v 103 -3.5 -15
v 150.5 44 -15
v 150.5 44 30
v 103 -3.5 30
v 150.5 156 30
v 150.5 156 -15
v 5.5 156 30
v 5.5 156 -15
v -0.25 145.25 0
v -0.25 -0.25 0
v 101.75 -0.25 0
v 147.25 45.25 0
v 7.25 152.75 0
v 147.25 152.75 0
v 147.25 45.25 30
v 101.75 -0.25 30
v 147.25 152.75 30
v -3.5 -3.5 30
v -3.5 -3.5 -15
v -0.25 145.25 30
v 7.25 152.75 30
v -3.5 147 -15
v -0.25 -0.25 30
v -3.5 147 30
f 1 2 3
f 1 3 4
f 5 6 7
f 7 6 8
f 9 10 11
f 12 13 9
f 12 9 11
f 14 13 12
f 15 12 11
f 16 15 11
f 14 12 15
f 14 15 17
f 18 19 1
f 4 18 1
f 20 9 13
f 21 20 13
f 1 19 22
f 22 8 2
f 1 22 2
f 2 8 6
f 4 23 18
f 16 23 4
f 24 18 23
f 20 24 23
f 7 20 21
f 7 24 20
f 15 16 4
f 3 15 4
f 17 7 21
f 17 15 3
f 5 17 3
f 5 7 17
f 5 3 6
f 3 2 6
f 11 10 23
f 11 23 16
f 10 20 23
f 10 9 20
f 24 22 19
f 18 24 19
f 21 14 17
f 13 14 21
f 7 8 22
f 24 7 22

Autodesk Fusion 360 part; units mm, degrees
sketch "BoardOutline" plane through (0, 0, 0) normal (0, 0, 1) x (1, 0, 0)
  line L0 (0, 0) -> (101.5, 0)
  line L1 (147, 45.5) -> (147, 152.5)
  line L2 (147, 152.5) -> (7.5, 152.5)
  line L3 (0, 145) -> (0, 0)
  line L4 (7.5, 152.5) -> (0, 145)
  line L5 (147, 45.5) -> (101.5, 0)
  line L6 (7.5, 152.5) -> (7.5, 0) construction
  line L7 (147, 45.5) -> (0, 45.5) construction
  line L8 (101.5, 0) -> (101.5, 152.5) construction
  circle A0 centre (101.5, 45.5) radius 2
  line L9 (0, 145) -> (147, 145) construction
  circle A1 centre (7.5, 145) radius 2
  circle A2 centre (41.5, 145) radius 2
  circle A3 centre (134.5, 145) radius 2
  line L10 (134.5, 152.5) -> (134.5, 33) construction
  circle A4 centre (134.5, 90) radius 2
  circle A5 centre (134.5, 90) radius 2
  circle A6 centre (134.5, 90) radius 2
  circle A7 centre (41.5, 90) radius 2
  circle A8 centre (7.5, 133.5) radius 1.5
  circle A9 centre (7.5, 124.5) radius 1
  circle A10 centre (7.5, 87.5) radius 1
  circle A11 centre (26.5, 124.5) radius 1
  circle A12 centre (26.5, 87.5) radius 1
  circle A13 centre (7.5, 73.5) radius 2
  circle A14 centre (7.5, 7.5) radius 2
  circle A15 centre (131.0677, 63.4488) radius 6 construction
  line L11 (16.5, 0) -> (23.5, 0) construction
  line L12 (23.5, 0) -> (23.5, 13.6837) construction
  line L13 (23.5, 13.6837) -> (16.5, 13.6837) construction
  line L14 (16.5, 13.6837) -> (16.5, 0) construction
  line L15 (96, 0) -> (26, 0) construction
  line L16 (26, 0) -> (26, 82.5) construction
  line L17 (26, 82.5) -> (96, 82.5) construction
  line L18 (96, 82.5) -> (96, 0) construction
  line L19 (55.5, 0) -> (55.5, 10) construction
  line L20 (55.5, 10) -> (45.5, 10) construction
  line L21 (45.5, 10) -> (45.5, 0) construction
  line L22 (45.5, 0) -> (55.5, 0) construction
  line L23 (101.5, 45.5) -> (96, 45.5) construction
  line L24 (55.5, 0) -> (96, 0) construction
  line L25 (51, 130) -> (125, 130) construction
  line L26 (125, 130) -> (125, 105) construction
  line L27 (125, 105) -> (51, 105) construction
  line L28 (51, 105) -> (51, 130) construction
  point P0 (147, 0)
  point P1 (0, 152.5)
  point P2 (7.5, 145)
  point P3 (7.5, 73.5)
  dimension "d1" = 147
  dimension "d2" = 152.5
  dimension "d3" = 7.5
  dimension "d4" = 7.5
  dimension "d5" = 45.5
  dimension "d6" = 45.5
  dimension "d8" = 4
  dimension "d12" = 4
  dimension "d13" = 4
  dimension "d14" = 4
  dimension "d15" = 4
  dimension "d16" = 4
  dimension "d17" = 4
  dimension "d18" = 4
  dimension "d20" = 3
  dimension "d23" = 2
  dimension "d24" = 2
  dimension "d25" = 2
  dimension "d26" = 2
  dimension "d27" = 4
  dimension "d28" = 4
  dimension "d31" = 12
  dimension "d34" = 7
  dimension "d35" = 70
  dimension "d36" = 82.5
  dimension "d39" = 10
  dimension "d40" = 5.5
  dimension "d41" = 93
  dimension "d43" = 55
  dimension "d46" = 34
sketch "CasingOutline" plane through (0, 0, 0) normal (0, 0, 1) x (1, 0, 0)
  line L0 (-0.25, -0.25) -> (101.75, -0.25)
  line L1 (147.25, 45.25) -> (147.25, 152.75)
  line L2 (147.25, 152.75) -> (7.25, 152.75)
  line L3 (-0.25, 145.25) -> (-0.25, -0.25)
  line L4 (-3.5, -3.5) -> (103, -3.5)
  line L5 (150.5, 44) -> (150.5, 156)
  line L6 (150.5, 156) -> (5.5, 156)
  line L7 (-3.5, 147) -> (-3.5, -3.5)
  line L8 (147, 152.5) -> (7.5, 152.5)
  line L9 (147.25, 45.25) -> (101.75, -0.25)
  line L10 (-0.25, 145.25) -> (7.25, 152.75)
  line L11 (5.5, 156) -> (-3.5, 147)
  line L12 (150.5, 44) -> (103, -3.5)
  point P0 (147.25, -0.25)
  point P1 (-0.25, 152.75)
  point P2 (150.5, -3.5)
  point P3 (-3.5, 156)
  dimension "d50" = 147.5
  dimension "d51" = 153
  dimension "d52" = 3.25
  dimension "d53" = 3.25
  dimension "d55" = 3.25
  dimension "d56" = 3.25
  dimension "d57" = 45.5
  dimension "d58" = 45.5
  dimension "d59" = 7.5
  dimension "d60" = 7.5
  dimension "d61" = 9
  dimension "d62" = 9
  dimension "d63" = 47.5
  dimension "d64" = 47.5
extrude "Extrude1" add sketch "CasingOutline" against normal blind 15 contours L0 L1 L2 L3 L9 L10 | L4 L5 L6 L7 L11 L12
extrude "Extrude2" add sketch "CasingOutline" along normal blind 30
equation "d4 = d3"
equation "d6 = d5"
equation "d58 = d57"
equation "d60 = d59"
equation "d62 = d61"
equation "d64 = d63"
